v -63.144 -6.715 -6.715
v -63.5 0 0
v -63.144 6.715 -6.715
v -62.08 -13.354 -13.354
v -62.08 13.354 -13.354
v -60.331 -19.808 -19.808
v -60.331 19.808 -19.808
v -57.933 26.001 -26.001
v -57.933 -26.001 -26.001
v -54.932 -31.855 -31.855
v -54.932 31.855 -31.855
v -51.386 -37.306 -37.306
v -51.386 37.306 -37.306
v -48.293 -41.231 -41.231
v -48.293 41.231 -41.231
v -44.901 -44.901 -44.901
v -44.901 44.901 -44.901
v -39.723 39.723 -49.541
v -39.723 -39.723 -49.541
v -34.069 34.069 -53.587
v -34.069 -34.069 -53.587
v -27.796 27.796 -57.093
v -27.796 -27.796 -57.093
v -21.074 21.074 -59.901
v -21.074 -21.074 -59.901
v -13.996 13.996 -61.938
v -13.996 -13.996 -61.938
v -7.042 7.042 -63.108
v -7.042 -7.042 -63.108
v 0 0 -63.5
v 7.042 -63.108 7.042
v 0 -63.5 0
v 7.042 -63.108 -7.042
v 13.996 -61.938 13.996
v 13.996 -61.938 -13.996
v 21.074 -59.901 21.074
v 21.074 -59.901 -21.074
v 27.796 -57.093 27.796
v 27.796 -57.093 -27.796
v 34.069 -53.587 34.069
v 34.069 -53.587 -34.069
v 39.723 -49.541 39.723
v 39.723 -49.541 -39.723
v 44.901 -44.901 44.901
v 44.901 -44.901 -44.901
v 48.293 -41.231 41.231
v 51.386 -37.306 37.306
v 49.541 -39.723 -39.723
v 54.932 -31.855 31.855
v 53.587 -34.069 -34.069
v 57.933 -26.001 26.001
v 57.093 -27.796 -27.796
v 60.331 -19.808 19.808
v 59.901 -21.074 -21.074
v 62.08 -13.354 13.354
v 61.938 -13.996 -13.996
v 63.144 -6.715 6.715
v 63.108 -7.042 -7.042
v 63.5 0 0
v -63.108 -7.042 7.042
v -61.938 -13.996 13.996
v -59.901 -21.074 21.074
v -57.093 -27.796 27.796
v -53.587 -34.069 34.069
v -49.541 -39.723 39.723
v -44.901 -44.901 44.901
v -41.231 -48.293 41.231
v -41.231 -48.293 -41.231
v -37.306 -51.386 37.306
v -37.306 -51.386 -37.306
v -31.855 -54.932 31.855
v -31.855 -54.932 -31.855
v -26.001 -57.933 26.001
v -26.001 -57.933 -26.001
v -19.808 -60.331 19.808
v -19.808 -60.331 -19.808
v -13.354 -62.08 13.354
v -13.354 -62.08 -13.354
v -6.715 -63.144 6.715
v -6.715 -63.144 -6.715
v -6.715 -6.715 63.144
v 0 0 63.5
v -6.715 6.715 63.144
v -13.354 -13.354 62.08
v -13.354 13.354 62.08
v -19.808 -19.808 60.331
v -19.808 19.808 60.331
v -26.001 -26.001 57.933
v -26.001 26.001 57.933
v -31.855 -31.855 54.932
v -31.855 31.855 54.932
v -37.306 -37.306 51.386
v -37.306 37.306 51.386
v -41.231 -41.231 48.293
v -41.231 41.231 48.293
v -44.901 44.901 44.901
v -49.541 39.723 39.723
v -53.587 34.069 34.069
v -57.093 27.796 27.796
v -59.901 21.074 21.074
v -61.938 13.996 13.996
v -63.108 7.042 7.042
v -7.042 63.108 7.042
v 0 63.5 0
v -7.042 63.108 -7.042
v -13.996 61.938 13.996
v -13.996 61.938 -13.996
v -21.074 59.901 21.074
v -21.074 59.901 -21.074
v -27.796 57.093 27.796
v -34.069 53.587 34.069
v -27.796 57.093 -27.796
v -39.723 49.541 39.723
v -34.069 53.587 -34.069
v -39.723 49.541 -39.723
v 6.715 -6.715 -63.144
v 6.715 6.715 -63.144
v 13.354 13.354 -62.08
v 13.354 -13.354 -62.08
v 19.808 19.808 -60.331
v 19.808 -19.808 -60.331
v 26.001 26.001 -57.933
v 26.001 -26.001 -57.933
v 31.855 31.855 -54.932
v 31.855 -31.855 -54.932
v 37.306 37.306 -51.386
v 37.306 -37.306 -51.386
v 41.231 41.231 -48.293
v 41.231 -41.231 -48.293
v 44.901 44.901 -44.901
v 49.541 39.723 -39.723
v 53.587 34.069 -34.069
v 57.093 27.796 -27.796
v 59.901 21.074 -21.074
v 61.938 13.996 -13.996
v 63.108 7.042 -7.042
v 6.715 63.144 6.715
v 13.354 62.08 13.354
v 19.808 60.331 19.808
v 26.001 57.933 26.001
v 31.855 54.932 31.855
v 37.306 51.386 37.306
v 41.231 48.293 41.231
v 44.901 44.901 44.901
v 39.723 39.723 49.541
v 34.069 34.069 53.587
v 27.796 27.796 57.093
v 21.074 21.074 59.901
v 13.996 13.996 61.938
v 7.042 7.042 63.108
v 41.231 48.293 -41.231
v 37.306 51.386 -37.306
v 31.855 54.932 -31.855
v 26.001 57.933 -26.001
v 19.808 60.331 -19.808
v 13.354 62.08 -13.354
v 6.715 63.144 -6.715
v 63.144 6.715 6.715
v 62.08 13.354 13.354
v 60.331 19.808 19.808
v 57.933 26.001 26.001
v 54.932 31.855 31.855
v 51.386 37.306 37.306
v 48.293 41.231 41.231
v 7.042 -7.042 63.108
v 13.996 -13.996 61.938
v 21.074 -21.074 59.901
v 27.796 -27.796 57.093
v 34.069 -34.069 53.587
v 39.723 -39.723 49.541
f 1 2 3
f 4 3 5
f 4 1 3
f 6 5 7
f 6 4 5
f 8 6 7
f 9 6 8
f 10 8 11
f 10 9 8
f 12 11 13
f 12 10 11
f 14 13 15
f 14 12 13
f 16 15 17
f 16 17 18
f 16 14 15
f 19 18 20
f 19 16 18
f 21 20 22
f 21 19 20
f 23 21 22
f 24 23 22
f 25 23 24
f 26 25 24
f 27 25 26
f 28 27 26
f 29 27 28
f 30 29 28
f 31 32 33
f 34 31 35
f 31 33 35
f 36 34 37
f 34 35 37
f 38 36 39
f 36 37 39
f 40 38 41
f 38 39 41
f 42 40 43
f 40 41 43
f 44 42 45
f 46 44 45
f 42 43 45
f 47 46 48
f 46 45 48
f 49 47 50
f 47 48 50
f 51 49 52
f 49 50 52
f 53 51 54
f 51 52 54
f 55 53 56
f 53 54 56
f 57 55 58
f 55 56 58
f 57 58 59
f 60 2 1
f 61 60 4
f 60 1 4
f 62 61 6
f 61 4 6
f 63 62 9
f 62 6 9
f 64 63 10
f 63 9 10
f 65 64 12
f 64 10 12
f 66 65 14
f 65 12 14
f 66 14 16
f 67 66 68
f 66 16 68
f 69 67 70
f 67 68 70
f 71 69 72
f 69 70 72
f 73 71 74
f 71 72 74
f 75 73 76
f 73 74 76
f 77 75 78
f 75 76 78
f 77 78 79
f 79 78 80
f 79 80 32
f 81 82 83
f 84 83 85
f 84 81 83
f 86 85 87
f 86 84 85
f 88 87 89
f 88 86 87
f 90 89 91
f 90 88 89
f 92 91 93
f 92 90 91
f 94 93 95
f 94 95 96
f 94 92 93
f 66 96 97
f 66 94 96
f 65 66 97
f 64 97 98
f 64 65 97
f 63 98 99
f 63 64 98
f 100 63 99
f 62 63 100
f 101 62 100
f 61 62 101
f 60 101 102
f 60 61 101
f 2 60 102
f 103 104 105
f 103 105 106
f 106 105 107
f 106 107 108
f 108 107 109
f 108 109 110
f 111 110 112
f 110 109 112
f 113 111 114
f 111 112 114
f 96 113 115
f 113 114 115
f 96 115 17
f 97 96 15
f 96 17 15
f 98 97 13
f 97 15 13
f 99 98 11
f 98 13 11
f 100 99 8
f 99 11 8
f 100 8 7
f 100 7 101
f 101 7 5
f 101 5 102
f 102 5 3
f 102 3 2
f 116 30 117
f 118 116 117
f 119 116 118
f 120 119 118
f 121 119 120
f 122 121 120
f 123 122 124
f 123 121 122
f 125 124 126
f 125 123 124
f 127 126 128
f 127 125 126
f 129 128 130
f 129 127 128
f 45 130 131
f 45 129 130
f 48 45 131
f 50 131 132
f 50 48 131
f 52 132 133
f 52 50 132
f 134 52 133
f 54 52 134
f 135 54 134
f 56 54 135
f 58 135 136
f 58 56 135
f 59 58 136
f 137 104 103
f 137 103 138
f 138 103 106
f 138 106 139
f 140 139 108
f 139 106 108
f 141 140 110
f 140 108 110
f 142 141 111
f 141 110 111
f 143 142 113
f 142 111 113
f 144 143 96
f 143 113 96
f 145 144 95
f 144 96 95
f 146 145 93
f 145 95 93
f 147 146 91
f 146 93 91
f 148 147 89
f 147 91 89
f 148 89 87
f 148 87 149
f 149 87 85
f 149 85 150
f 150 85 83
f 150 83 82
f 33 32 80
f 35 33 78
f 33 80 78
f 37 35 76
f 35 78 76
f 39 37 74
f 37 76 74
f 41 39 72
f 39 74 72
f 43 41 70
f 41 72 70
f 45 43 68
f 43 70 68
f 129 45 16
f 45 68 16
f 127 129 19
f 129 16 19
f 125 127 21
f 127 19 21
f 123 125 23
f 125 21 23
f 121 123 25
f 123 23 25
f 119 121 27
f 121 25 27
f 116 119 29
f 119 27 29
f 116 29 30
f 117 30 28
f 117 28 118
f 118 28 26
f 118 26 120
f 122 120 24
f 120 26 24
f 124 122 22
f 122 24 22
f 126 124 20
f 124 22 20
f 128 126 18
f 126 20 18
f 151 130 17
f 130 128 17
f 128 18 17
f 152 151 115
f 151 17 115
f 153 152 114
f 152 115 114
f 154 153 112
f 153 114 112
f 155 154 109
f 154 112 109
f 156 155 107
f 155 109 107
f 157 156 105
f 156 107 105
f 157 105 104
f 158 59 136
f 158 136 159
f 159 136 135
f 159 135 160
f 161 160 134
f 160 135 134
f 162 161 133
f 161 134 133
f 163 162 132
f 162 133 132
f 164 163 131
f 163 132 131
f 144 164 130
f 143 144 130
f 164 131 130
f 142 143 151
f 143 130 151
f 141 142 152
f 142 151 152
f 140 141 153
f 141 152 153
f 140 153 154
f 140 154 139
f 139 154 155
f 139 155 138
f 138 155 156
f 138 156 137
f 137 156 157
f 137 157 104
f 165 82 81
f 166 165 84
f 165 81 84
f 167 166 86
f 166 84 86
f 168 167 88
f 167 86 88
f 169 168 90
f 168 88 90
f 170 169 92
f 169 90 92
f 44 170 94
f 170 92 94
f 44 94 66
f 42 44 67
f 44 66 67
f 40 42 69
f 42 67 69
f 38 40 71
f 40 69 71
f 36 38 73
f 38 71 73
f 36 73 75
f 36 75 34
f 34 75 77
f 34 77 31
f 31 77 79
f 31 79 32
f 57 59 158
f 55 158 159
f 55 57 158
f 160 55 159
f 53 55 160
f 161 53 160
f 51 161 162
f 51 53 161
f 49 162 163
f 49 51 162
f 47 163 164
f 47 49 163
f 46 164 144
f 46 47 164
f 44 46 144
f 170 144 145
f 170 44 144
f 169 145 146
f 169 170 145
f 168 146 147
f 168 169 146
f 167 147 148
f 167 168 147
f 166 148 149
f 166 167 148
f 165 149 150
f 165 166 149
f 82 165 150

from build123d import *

# Parameters (mm, degrees)
F0_R     = 63.5
F1_DEPTH = 63.5
F2_W     = 209.9135220051
F2_H     = 188.6474490166
F2_R     = 63.5
F3_DEPTH = 63.5
F4_W     = 154.9591273069
F4_H     = 152.5524
F4_R     = 63.5
F5_DEPTH = 63.5


with BuildPart() as f1:
    # F0 (on Front) → F1 (new body, symmetric)
    with BuildSketch(Plane.XZ):
        Circle(F0_R)
    extrude(amount=F1_DEPTH, both=True)

    # F2 (on Top) → F3 (cut, symmetric)
    with BuildSketch(Plane.XY):
        Rectangle(F2_W, F2_H)
        Circle(F2_R, mode=Mode.SUBTRACT)
    extrude(amount=F3_DEPTH, both=True, mode=Mode.SUBTRACT)

    # F4 (on Right) → F5 (cut, symmetric)
    with BuildSketch(Plane.YZ):
        Rectangle(F4_W, F4_H)
        Circle(F4_R, mode=Mode.SUBTRACT)
    extrude(amount=F5_DEPTH, both=True, mode=Mode.SUBTRACT)


solid = f1.part
